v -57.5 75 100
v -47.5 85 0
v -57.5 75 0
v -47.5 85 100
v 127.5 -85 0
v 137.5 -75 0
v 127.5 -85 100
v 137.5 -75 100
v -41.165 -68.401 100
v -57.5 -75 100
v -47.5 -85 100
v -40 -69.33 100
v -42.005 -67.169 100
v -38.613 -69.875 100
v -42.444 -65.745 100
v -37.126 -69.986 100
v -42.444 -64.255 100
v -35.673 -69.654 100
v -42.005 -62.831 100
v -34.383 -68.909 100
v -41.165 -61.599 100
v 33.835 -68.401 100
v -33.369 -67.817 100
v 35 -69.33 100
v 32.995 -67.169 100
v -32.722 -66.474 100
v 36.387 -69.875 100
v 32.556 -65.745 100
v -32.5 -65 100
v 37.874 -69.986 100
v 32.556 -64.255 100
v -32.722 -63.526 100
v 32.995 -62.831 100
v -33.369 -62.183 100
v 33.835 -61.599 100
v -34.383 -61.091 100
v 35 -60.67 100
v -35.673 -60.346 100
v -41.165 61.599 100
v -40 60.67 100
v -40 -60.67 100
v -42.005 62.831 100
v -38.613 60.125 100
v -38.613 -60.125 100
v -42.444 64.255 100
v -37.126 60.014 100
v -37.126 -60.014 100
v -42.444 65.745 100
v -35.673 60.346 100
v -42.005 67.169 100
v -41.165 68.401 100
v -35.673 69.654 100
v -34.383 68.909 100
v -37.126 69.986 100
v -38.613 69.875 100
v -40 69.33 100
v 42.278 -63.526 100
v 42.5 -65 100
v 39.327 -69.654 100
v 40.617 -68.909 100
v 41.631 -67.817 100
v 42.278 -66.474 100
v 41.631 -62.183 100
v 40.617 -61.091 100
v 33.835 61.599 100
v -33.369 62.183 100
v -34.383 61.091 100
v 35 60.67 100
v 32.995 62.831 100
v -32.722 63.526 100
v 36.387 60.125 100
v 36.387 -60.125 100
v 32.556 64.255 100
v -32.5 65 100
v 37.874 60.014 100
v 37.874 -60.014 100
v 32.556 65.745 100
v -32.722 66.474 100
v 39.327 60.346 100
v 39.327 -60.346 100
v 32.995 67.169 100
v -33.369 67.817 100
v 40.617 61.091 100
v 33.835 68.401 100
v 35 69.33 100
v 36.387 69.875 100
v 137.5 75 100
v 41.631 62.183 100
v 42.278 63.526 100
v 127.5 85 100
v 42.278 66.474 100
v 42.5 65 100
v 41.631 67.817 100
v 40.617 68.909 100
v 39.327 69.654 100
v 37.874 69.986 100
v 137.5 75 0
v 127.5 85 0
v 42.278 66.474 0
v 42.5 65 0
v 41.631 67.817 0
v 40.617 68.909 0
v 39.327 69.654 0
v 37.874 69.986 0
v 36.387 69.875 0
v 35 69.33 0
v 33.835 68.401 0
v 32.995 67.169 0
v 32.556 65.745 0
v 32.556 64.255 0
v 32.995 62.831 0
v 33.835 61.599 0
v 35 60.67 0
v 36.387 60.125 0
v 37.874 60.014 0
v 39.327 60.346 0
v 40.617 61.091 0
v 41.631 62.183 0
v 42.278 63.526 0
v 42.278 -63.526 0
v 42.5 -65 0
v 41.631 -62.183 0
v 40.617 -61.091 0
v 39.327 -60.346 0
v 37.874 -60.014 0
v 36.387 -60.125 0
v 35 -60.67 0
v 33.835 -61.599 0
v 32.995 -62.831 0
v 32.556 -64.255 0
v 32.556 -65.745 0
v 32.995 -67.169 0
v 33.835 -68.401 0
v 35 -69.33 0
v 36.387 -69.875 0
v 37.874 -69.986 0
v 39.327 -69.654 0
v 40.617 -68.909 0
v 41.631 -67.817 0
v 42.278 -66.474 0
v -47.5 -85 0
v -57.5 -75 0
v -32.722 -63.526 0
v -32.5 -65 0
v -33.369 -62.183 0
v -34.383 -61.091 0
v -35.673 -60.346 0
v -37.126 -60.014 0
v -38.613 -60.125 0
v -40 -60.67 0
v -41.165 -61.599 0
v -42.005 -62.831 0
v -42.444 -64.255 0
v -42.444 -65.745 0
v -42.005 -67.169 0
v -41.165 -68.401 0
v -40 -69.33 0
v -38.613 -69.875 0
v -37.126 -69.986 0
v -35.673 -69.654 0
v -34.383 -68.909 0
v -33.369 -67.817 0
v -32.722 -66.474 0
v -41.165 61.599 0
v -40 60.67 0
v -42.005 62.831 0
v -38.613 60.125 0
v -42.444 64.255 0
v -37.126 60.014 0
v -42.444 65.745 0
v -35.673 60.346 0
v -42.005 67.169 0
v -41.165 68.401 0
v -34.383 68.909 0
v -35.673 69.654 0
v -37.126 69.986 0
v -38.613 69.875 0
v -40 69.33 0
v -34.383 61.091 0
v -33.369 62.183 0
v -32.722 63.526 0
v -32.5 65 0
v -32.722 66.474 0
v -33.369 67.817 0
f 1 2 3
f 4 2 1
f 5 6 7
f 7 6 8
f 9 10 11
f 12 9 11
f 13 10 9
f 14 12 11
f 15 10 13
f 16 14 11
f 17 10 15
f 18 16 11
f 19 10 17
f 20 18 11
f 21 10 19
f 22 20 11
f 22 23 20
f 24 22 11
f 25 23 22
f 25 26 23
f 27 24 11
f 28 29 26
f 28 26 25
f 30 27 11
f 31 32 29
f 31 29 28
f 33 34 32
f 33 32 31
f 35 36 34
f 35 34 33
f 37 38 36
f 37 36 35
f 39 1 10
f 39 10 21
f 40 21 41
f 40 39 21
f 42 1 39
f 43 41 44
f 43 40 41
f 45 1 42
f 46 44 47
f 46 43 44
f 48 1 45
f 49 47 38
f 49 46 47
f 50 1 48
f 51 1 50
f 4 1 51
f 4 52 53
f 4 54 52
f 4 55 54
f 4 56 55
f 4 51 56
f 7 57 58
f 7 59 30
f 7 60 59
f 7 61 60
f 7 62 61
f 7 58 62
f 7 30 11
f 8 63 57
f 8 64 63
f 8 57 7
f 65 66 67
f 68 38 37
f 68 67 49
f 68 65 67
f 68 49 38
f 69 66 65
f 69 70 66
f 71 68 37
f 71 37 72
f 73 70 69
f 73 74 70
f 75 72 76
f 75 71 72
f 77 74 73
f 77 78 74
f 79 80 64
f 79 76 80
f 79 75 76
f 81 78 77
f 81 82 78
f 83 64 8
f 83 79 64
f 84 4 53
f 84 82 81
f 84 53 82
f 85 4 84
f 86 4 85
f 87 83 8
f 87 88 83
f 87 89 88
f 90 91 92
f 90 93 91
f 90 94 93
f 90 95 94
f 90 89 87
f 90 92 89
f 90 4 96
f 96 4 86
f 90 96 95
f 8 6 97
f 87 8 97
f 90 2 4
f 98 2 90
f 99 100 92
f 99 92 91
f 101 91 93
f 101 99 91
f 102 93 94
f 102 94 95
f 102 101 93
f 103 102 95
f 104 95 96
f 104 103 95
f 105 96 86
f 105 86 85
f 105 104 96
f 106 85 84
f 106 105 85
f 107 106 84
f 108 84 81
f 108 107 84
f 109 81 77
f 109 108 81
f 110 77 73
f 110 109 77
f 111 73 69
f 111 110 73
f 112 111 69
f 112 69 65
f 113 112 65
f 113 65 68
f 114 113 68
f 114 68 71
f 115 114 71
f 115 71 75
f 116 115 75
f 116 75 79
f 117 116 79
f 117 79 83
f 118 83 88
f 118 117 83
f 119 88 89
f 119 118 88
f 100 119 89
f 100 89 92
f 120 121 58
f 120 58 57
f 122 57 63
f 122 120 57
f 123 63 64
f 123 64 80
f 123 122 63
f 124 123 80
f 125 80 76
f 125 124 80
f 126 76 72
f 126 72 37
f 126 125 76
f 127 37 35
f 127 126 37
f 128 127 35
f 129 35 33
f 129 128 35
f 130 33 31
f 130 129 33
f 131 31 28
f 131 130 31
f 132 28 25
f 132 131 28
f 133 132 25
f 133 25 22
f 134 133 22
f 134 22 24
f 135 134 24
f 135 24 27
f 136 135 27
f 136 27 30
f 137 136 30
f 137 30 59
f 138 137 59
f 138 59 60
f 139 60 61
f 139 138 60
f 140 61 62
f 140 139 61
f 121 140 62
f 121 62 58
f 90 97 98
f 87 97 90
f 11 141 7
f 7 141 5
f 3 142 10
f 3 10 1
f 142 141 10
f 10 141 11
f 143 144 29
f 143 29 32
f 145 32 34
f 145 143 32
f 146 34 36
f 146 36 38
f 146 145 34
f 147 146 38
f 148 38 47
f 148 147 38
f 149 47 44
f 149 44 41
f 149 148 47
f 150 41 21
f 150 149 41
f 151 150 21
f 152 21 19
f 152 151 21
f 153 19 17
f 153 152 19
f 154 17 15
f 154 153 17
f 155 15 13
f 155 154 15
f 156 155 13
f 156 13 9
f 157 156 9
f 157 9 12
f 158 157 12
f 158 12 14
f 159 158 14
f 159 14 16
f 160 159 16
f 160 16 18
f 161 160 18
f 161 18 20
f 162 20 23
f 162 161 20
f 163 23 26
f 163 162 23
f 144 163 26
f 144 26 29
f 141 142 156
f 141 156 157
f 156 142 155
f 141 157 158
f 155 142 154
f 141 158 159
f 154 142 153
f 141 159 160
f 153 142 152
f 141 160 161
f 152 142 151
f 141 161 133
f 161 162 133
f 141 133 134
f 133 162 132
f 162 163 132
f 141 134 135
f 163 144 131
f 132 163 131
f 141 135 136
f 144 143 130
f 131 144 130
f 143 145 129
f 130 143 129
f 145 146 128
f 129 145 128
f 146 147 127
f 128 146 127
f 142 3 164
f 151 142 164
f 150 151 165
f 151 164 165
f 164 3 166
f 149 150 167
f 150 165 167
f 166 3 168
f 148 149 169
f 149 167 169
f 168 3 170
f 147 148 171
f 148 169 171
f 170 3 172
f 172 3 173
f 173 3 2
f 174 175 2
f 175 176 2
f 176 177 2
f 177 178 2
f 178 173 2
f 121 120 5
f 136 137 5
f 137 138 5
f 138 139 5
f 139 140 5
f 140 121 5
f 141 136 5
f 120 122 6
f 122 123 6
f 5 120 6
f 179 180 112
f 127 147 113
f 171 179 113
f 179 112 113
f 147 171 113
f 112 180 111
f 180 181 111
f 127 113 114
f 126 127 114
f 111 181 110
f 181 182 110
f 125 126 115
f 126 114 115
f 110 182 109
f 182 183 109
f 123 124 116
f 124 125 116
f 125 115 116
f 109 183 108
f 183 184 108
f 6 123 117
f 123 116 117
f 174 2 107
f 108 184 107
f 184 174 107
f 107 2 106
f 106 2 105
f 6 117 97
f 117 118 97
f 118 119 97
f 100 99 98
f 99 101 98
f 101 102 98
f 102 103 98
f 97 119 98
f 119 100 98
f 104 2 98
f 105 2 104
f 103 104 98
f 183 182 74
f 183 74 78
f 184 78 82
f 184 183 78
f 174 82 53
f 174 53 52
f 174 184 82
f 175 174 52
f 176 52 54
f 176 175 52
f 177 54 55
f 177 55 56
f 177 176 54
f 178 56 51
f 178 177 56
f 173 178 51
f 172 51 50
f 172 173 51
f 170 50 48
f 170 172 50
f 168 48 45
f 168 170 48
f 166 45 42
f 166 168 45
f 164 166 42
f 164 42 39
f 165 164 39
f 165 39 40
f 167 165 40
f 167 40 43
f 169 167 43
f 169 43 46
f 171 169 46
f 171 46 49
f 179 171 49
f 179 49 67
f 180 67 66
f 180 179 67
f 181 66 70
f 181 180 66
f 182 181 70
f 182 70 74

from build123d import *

# Parameters (mm, degrees)
SKETCH_1_W      = 195
SKETCH_1_H      = 170
SKETCH_1_R      = 5
EXTRUDE_1_DEPTH = 100
CHAMFER_1_SIZE  = 10


with BuildPart() as part:
    # 草图1 → 凸台-拉伸1 (new body)
    with BuildSketch(Plane.XY):
        with Locations((40, 0)):
            Rectangle(SKETCH_1_W, SKETCH_1_H)
        with Locations((-37.5, 65)):
            Circle(SKETCH_1_R, mode=Mode.SUBTRACT)
        with Locations((37.5, 65)):
            Circle(SKETCH_1_R, mode=Mode.SUBTRACT)
        with Locations((-37.5, -65)):
            Circle(SKETCH_1_R, mode=Mode.SUBTRACT)
        with Locations((37.5, -65)):
            Circle(SKETCH_1_R, mode=Mode.SUBTRACT)
    extrude(amount=EXTRUDE_1_DEPTH)

    # 倒角1
    chamfer_1_edges = [part.edges().sort_by_distance(p)[0] for p in [
        (137.5, -85, 50),
        (-57.5, -85, 50),
        (-57.5, 85, 50),
        (137.5, 85, 50),
    ]]
    chamfer(chamfer_1_edges, length=CHAMFER_1_SIZE)


solid = part.part
